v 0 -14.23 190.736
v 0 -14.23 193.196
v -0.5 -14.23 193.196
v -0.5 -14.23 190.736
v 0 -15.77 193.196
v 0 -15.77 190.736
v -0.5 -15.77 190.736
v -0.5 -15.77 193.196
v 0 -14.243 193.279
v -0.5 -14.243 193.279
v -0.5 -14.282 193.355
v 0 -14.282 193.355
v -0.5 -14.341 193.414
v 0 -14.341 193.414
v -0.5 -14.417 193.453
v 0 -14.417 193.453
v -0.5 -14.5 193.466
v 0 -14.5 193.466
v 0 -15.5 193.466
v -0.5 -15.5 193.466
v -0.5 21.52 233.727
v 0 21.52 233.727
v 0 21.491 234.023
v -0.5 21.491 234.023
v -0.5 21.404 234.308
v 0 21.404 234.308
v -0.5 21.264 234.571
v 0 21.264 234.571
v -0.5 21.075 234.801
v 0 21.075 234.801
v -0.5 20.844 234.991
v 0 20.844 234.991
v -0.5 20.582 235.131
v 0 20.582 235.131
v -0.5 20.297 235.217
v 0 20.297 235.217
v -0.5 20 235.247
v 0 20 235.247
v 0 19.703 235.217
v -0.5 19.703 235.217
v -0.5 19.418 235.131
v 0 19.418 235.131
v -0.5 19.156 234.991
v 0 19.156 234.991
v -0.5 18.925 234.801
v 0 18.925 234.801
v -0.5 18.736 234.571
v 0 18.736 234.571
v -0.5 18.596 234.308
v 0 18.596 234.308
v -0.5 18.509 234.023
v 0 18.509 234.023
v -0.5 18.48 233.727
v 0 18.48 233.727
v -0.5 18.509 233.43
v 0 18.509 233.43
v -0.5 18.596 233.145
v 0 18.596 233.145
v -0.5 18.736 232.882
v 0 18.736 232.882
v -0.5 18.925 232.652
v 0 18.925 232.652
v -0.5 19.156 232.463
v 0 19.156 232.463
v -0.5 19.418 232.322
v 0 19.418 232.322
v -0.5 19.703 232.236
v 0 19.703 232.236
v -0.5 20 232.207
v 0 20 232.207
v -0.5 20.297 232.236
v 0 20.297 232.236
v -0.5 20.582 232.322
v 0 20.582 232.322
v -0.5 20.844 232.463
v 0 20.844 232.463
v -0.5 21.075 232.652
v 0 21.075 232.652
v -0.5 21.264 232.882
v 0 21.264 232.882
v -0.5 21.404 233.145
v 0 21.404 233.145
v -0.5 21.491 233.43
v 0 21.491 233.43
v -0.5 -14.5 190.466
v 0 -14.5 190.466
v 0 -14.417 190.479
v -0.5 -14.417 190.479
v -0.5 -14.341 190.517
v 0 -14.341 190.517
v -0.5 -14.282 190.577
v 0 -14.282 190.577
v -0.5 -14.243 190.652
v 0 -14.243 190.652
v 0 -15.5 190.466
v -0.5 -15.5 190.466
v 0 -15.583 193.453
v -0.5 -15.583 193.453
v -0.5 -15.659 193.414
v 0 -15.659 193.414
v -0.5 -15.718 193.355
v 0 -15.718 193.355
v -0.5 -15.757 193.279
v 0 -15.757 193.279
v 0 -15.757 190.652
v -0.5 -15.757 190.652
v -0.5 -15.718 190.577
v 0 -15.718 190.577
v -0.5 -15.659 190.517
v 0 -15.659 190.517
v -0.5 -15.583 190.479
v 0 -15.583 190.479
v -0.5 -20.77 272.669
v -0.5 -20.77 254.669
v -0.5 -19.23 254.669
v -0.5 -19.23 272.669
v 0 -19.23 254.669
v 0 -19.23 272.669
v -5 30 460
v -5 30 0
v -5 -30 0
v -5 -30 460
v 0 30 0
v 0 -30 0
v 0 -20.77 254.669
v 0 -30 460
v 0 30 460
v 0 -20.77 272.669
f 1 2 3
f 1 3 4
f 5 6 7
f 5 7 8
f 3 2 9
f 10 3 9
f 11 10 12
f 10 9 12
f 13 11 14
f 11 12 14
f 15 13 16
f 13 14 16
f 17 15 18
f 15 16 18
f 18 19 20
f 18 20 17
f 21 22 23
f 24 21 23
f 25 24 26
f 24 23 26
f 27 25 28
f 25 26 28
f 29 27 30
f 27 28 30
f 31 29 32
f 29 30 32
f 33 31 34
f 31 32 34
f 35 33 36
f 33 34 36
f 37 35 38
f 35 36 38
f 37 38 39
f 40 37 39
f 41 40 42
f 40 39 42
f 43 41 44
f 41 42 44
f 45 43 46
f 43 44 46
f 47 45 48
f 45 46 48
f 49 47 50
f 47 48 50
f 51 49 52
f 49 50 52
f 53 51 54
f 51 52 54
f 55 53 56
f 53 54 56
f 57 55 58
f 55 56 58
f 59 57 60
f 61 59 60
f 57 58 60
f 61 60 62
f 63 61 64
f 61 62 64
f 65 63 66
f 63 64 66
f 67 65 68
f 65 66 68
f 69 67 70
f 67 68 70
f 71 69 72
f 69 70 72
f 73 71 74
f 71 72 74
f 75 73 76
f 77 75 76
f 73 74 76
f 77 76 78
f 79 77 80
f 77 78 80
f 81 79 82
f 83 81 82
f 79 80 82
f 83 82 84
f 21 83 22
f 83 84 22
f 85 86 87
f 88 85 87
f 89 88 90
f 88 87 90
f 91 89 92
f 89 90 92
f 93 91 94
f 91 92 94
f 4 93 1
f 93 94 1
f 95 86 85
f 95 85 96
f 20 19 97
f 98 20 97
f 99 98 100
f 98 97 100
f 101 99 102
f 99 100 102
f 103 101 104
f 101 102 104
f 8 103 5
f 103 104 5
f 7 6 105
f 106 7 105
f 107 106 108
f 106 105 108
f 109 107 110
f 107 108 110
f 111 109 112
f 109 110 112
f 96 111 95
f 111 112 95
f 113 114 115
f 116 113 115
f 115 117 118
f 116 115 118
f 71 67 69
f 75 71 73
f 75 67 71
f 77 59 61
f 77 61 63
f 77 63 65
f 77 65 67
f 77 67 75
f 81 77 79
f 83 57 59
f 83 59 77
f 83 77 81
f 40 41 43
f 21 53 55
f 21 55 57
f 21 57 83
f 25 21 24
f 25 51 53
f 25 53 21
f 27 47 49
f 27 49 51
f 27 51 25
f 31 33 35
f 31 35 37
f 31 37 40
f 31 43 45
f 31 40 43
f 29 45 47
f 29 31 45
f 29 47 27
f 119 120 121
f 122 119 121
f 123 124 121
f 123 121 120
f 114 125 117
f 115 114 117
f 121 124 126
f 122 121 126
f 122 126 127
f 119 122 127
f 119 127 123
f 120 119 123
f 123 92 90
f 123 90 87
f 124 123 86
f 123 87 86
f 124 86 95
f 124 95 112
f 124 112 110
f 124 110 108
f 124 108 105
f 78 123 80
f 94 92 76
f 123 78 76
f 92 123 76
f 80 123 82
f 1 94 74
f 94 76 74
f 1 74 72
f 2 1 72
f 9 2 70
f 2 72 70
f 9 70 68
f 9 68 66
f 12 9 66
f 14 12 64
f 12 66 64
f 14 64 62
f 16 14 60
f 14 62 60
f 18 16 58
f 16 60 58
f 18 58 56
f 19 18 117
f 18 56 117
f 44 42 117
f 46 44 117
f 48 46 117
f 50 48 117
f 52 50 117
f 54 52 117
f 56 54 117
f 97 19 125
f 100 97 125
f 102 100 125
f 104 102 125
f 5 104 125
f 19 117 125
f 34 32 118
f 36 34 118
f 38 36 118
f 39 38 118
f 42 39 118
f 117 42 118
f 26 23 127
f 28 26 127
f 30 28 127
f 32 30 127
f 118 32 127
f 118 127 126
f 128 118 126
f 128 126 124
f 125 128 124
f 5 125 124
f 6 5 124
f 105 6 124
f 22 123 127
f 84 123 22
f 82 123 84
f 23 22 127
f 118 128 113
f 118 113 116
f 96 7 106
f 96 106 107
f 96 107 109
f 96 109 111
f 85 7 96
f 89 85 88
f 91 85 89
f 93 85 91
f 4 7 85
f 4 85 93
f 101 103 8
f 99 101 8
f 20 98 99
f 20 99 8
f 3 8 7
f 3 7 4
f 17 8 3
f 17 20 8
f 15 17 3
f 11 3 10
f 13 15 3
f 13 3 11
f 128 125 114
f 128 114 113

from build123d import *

# Parameters (mm, degrees)
PAD_DEPTH       = 5
SKETCH001_R     = 1.52
POCKET_DEPTH    = 0.5
SKETCH002_W     = 1.54
SKETCH002_H     = 18
POCKET001_DEPTH = 0.5
POCKET002_DEPTH = 0.5


with BuildPart() as part:
    # Sketch → Pad (new body)
    with BuildSketch(Plane.YZ):
        Polygon((0, 0), (-30, 0), (-30, 460), (30, 460), (30, 0), align=None)
    extrude(amount=-PAD_DEPTH)

    # Sketch001 → Pocket (cut)
    with BuildSketch(Plane.YZ):
        with Locations((20, 233.726693)):
            Circle(SKETCH001_R)
    extrude(amount=-POCKET_DEPTH, mode=Mode.SUBTRACT)

    # Sketch002 → Pocket001 (cut)
    with BuildSketch(Plane.YZ):
        with Locations((-20, 263.669193)):
            Rectangle(SKETCH002_W, SKETCH002_H)
    extrude(amount=-POCKET001_DEPTH, mode=Mode.SUBTRACT)

    # Sketch003 → Pocket002 (cut)
    with BuildSketch(Plane.YZ):
        with BuildLine():
            ThreePointArc((-15.5, 193.465807), (-15.690919, 193.386726), (-15.77, 193.195807))
            Line((-15.77, 190.735807), (-15.77, 193.195807))
            ThreePointArc((-15.77, 190.735807), (-15.690919, 190.544888), (-15.5, 190.465807))
            Line((-14.5, 190.465807), (-15.5, 190.465807))
            ThreePointArc((-14.5, 190.465807), (-14.309081, 190.544888), (-14.23, 190.735807))
            Line((-14.23, 193.195807), (-14.23, 190.735807))
            ThreePointArc((-14.23, 193.195807), (-14.309081, 193.386726), (-14.5, 193.465807))
            Line((-15.5, 193.465807), (-14.5, 193.465807))
        make_face()
    extrude(amount=-POCKET002_DEPTH, mode=Mode.SUBTRACT)


solid = part.part
